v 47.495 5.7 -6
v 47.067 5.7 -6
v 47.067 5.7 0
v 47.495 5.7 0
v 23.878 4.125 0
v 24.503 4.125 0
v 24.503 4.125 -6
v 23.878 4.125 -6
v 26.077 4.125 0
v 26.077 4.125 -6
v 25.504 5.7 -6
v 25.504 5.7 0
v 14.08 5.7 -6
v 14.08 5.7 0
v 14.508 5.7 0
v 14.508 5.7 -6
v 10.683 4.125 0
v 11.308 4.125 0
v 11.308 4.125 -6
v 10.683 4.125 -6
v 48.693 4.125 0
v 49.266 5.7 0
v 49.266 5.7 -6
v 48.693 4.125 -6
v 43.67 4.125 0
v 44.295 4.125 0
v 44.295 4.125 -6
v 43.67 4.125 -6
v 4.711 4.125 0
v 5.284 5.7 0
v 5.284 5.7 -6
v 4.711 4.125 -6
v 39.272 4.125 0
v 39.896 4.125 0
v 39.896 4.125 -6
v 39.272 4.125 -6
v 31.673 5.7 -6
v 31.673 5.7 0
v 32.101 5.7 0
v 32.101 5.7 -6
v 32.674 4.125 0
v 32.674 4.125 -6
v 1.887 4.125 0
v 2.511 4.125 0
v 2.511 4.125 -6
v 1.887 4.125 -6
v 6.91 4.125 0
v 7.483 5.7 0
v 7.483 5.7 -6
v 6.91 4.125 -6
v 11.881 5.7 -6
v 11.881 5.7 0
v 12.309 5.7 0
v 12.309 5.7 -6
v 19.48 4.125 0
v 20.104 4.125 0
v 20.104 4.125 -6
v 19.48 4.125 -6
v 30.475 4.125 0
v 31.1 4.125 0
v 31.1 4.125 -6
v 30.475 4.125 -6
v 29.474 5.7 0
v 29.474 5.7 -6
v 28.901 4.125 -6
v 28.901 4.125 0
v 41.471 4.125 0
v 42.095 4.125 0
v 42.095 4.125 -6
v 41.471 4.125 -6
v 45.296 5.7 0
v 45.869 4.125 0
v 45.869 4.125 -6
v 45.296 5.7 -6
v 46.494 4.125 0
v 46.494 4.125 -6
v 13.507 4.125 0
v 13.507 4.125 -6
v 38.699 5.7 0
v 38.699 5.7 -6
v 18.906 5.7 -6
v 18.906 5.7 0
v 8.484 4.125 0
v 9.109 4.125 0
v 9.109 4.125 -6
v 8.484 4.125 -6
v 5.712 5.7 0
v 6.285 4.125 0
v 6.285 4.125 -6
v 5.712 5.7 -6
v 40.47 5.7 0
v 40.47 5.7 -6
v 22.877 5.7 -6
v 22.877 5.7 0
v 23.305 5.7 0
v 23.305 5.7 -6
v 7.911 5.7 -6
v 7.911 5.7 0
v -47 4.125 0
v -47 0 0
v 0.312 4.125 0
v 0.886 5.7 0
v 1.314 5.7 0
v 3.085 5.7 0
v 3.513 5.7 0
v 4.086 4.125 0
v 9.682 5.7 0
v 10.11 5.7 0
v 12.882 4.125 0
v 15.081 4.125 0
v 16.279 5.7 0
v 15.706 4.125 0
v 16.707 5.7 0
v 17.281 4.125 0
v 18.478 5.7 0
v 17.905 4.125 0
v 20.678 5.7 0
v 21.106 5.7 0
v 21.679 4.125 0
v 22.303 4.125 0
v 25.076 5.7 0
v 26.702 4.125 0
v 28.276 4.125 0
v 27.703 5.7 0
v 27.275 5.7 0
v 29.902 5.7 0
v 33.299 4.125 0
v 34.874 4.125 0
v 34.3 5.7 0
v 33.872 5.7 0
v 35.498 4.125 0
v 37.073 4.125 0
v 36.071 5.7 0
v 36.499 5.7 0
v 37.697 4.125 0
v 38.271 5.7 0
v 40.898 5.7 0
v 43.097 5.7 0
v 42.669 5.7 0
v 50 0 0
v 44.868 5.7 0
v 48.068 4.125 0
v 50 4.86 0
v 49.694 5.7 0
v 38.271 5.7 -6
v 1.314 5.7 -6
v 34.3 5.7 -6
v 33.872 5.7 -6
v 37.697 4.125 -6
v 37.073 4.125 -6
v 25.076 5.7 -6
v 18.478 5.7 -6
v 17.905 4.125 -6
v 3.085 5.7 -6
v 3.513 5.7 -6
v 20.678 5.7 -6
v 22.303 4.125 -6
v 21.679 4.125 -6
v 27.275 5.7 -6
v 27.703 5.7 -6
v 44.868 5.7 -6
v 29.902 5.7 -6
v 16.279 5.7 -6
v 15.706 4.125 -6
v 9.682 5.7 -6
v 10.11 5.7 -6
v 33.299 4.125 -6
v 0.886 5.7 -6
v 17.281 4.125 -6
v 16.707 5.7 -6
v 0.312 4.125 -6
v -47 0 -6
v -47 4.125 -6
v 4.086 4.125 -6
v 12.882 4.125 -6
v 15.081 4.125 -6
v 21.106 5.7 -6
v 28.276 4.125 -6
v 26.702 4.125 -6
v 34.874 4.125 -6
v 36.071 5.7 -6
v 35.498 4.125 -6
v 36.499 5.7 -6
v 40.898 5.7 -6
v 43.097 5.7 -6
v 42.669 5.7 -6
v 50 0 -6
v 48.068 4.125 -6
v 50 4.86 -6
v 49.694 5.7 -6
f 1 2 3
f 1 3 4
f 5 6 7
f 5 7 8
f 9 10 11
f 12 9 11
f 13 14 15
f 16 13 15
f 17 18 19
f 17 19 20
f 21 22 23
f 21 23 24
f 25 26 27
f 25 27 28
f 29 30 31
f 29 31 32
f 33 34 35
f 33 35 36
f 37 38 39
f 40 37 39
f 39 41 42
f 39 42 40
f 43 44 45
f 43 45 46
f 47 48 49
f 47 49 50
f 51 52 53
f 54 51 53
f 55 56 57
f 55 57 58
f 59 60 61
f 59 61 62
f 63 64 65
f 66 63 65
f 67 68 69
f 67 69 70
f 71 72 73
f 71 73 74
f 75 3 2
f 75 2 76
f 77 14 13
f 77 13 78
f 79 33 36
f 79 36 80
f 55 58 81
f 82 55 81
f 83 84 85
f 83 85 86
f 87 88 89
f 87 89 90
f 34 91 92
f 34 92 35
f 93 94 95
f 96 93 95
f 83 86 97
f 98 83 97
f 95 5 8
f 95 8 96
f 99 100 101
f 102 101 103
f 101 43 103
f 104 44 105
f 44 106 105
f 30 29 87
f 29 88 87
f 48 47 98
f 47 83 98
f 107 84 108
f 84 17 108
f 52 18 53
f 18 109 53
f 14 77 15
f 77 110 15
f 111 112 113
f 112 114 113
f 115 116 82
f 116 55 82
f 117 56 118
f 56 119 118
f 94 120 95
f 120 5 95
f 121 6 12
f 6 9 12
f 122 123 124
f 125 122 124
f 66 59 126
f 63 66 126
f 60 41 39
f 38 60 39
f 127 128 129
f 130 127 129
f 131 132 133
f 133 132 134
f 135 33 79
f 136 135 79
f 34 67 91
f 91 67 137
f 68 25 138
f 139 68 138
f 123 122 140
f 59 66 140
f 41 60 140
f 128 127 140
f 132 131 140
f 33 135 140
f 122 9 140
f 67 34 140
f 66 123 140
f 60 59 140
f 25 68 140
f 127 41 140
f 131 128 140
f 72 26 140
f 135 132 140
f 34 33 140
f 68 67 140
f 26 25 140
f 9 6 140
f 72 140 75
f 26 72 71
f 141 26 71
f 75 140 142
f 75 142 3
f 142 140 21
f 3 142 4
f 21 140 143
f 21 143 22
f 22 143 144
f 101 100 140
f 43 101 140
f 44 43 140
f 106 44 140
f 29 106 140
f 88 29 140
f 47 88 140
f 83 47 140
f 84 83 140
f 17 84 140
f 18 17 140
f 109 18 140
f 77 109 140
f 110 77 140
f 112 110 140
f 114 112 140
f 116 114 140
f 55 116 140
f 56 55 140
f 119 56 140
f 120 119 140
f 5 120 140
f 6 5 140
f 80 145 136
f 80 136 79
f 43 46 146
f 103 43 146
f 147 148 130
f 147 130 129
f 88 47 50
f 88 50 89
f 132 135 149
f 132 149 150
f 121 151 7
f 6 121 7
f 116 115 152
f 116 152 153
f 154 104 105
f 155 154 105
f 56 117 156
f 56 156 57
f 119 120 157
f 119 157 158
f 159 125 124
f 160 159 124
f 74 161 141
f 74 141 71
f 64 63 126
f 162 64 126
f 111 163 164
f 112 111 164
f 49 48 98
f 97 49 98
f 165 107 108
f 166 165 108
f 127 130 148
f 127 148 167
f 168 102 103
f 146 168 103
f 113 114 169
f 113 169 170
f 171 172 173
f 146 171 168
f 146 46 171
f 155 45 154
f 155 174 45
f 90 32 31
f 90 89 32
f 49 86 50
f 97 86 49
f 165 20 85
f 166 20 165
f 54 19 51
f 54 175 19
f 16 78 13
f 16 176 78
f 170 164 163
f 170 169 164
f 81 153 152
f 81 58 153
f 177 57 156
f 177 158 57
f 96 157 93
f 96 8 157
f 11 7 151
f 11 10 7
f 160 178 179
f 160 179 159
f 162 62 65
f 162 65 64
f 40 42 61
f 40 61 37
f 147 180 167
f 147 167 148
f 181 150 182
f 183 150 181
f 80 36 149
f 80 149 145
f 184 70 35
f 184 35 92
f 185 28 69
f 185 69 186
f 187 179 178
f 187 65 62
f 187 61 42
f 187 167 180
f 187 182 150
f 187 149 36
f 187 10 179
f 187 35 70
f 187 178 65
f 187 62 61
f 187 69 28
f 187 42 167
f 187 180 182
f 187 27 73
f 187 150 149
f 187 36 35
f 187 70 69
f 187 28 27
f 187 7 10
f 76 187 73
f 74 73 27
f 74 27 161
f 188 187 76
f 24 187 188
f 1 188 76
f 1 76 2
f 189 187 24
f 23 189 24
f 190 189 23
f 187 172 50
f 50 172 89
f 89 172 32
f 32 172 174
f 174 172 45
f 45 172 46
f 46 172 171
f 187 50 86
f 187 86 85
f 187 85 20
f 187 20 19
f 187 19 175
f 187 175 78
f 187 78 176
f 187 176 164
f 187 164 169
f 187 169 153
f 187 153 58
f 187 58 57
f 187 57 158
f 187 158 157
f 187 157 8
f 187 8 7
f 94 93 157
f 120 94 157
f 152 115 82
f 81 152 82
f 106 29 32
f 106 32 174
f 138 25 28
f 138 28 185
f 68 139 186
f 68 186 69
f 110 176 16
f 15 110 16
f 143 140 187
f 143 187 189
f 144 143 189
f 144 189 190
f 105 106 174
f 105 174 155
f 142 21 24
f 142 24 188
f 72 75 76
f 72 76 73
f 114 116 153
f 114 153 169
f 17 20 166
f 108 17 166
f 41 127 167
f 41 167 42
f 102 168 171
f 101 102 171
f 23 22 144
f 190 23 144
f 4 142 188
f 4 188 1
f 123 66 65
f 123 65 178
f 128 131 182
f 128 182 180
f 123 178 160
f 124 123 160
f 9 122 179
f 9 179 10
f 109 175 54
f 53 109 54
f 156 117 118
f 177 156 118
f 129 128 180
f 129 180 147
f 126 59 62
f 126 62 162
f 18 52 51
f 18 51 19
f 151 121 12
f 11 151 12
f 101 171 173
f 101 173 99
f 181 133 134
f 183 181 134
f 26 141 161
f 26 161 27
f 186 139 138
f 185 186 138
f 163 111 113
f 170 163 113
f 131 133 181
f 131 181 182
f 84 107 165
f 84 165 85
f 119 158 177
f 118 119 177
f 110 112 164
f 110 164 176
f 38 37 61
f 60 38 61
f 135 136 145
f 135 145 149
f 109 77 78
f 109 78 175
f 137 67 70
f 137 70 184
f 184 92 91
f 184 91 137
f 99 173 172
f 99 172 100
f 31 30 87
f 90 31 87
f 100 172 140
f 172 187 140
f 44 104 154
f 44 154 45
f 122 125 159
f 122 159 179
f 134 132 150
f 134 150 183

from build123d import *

# Parameters (mm, degrees)
BLANKSKE_W        = 50
BLANKSKE_H        = 5.7
BLANK_DEPTH       = 6
TOOTHCUTSIM_DEPTH = 51.680272296
TEETHCUTS_COUNT   = 24
TEETHCUTS_PITCH   = 2.199114855
SKETCH_1_W        = 6
SKETCH_1_H        = 4.125
EXTRUDE_1_DEPTH   = 47


with BuildPart() as part:
    # BlankSke → Blank (new body)
    with BuildSketch(Plane.XY):
        with Locations((25, 2.85)):
            Rectangle(BLANKSKE_W, BLANKSKE_H)
    extrude(amount=-BLANK_DEPTH)

    # TooCutSkeSim → ToothCutSim (cut, through all)
    with BuildSketch(Plane.XY):
        Polygon((0.312304759, 4.125), (-0.312304759, 4.125), (-0.894802722, 5.7254), (0.894802722, 5.7254), align=None)
    toothcutsim = extrude(amount=-TOOTHCUTSIM_DEPTH, mode=Mode.SUBTRACT)

    # TeethCuts: ToothCutSim ×24
    with Locations(*[(i * TEETHCUTS_PITCH, 0, 0) for i in range(1, TEETHCUTS_COUNT)]):
        add(toothcutsim, mode=Mode.SUBTRACT)

    # 草图1 → 凸台-拉伸1 (add)
    with BuildSketch(Plane.ZY):
        with Locations((-3, 2.0625)):
            Rectangle(SKETCH_1_W, SKETCH_1_H)
    extrude(amount=EXTRUDE_1_DEPTH)


solid = part.part
